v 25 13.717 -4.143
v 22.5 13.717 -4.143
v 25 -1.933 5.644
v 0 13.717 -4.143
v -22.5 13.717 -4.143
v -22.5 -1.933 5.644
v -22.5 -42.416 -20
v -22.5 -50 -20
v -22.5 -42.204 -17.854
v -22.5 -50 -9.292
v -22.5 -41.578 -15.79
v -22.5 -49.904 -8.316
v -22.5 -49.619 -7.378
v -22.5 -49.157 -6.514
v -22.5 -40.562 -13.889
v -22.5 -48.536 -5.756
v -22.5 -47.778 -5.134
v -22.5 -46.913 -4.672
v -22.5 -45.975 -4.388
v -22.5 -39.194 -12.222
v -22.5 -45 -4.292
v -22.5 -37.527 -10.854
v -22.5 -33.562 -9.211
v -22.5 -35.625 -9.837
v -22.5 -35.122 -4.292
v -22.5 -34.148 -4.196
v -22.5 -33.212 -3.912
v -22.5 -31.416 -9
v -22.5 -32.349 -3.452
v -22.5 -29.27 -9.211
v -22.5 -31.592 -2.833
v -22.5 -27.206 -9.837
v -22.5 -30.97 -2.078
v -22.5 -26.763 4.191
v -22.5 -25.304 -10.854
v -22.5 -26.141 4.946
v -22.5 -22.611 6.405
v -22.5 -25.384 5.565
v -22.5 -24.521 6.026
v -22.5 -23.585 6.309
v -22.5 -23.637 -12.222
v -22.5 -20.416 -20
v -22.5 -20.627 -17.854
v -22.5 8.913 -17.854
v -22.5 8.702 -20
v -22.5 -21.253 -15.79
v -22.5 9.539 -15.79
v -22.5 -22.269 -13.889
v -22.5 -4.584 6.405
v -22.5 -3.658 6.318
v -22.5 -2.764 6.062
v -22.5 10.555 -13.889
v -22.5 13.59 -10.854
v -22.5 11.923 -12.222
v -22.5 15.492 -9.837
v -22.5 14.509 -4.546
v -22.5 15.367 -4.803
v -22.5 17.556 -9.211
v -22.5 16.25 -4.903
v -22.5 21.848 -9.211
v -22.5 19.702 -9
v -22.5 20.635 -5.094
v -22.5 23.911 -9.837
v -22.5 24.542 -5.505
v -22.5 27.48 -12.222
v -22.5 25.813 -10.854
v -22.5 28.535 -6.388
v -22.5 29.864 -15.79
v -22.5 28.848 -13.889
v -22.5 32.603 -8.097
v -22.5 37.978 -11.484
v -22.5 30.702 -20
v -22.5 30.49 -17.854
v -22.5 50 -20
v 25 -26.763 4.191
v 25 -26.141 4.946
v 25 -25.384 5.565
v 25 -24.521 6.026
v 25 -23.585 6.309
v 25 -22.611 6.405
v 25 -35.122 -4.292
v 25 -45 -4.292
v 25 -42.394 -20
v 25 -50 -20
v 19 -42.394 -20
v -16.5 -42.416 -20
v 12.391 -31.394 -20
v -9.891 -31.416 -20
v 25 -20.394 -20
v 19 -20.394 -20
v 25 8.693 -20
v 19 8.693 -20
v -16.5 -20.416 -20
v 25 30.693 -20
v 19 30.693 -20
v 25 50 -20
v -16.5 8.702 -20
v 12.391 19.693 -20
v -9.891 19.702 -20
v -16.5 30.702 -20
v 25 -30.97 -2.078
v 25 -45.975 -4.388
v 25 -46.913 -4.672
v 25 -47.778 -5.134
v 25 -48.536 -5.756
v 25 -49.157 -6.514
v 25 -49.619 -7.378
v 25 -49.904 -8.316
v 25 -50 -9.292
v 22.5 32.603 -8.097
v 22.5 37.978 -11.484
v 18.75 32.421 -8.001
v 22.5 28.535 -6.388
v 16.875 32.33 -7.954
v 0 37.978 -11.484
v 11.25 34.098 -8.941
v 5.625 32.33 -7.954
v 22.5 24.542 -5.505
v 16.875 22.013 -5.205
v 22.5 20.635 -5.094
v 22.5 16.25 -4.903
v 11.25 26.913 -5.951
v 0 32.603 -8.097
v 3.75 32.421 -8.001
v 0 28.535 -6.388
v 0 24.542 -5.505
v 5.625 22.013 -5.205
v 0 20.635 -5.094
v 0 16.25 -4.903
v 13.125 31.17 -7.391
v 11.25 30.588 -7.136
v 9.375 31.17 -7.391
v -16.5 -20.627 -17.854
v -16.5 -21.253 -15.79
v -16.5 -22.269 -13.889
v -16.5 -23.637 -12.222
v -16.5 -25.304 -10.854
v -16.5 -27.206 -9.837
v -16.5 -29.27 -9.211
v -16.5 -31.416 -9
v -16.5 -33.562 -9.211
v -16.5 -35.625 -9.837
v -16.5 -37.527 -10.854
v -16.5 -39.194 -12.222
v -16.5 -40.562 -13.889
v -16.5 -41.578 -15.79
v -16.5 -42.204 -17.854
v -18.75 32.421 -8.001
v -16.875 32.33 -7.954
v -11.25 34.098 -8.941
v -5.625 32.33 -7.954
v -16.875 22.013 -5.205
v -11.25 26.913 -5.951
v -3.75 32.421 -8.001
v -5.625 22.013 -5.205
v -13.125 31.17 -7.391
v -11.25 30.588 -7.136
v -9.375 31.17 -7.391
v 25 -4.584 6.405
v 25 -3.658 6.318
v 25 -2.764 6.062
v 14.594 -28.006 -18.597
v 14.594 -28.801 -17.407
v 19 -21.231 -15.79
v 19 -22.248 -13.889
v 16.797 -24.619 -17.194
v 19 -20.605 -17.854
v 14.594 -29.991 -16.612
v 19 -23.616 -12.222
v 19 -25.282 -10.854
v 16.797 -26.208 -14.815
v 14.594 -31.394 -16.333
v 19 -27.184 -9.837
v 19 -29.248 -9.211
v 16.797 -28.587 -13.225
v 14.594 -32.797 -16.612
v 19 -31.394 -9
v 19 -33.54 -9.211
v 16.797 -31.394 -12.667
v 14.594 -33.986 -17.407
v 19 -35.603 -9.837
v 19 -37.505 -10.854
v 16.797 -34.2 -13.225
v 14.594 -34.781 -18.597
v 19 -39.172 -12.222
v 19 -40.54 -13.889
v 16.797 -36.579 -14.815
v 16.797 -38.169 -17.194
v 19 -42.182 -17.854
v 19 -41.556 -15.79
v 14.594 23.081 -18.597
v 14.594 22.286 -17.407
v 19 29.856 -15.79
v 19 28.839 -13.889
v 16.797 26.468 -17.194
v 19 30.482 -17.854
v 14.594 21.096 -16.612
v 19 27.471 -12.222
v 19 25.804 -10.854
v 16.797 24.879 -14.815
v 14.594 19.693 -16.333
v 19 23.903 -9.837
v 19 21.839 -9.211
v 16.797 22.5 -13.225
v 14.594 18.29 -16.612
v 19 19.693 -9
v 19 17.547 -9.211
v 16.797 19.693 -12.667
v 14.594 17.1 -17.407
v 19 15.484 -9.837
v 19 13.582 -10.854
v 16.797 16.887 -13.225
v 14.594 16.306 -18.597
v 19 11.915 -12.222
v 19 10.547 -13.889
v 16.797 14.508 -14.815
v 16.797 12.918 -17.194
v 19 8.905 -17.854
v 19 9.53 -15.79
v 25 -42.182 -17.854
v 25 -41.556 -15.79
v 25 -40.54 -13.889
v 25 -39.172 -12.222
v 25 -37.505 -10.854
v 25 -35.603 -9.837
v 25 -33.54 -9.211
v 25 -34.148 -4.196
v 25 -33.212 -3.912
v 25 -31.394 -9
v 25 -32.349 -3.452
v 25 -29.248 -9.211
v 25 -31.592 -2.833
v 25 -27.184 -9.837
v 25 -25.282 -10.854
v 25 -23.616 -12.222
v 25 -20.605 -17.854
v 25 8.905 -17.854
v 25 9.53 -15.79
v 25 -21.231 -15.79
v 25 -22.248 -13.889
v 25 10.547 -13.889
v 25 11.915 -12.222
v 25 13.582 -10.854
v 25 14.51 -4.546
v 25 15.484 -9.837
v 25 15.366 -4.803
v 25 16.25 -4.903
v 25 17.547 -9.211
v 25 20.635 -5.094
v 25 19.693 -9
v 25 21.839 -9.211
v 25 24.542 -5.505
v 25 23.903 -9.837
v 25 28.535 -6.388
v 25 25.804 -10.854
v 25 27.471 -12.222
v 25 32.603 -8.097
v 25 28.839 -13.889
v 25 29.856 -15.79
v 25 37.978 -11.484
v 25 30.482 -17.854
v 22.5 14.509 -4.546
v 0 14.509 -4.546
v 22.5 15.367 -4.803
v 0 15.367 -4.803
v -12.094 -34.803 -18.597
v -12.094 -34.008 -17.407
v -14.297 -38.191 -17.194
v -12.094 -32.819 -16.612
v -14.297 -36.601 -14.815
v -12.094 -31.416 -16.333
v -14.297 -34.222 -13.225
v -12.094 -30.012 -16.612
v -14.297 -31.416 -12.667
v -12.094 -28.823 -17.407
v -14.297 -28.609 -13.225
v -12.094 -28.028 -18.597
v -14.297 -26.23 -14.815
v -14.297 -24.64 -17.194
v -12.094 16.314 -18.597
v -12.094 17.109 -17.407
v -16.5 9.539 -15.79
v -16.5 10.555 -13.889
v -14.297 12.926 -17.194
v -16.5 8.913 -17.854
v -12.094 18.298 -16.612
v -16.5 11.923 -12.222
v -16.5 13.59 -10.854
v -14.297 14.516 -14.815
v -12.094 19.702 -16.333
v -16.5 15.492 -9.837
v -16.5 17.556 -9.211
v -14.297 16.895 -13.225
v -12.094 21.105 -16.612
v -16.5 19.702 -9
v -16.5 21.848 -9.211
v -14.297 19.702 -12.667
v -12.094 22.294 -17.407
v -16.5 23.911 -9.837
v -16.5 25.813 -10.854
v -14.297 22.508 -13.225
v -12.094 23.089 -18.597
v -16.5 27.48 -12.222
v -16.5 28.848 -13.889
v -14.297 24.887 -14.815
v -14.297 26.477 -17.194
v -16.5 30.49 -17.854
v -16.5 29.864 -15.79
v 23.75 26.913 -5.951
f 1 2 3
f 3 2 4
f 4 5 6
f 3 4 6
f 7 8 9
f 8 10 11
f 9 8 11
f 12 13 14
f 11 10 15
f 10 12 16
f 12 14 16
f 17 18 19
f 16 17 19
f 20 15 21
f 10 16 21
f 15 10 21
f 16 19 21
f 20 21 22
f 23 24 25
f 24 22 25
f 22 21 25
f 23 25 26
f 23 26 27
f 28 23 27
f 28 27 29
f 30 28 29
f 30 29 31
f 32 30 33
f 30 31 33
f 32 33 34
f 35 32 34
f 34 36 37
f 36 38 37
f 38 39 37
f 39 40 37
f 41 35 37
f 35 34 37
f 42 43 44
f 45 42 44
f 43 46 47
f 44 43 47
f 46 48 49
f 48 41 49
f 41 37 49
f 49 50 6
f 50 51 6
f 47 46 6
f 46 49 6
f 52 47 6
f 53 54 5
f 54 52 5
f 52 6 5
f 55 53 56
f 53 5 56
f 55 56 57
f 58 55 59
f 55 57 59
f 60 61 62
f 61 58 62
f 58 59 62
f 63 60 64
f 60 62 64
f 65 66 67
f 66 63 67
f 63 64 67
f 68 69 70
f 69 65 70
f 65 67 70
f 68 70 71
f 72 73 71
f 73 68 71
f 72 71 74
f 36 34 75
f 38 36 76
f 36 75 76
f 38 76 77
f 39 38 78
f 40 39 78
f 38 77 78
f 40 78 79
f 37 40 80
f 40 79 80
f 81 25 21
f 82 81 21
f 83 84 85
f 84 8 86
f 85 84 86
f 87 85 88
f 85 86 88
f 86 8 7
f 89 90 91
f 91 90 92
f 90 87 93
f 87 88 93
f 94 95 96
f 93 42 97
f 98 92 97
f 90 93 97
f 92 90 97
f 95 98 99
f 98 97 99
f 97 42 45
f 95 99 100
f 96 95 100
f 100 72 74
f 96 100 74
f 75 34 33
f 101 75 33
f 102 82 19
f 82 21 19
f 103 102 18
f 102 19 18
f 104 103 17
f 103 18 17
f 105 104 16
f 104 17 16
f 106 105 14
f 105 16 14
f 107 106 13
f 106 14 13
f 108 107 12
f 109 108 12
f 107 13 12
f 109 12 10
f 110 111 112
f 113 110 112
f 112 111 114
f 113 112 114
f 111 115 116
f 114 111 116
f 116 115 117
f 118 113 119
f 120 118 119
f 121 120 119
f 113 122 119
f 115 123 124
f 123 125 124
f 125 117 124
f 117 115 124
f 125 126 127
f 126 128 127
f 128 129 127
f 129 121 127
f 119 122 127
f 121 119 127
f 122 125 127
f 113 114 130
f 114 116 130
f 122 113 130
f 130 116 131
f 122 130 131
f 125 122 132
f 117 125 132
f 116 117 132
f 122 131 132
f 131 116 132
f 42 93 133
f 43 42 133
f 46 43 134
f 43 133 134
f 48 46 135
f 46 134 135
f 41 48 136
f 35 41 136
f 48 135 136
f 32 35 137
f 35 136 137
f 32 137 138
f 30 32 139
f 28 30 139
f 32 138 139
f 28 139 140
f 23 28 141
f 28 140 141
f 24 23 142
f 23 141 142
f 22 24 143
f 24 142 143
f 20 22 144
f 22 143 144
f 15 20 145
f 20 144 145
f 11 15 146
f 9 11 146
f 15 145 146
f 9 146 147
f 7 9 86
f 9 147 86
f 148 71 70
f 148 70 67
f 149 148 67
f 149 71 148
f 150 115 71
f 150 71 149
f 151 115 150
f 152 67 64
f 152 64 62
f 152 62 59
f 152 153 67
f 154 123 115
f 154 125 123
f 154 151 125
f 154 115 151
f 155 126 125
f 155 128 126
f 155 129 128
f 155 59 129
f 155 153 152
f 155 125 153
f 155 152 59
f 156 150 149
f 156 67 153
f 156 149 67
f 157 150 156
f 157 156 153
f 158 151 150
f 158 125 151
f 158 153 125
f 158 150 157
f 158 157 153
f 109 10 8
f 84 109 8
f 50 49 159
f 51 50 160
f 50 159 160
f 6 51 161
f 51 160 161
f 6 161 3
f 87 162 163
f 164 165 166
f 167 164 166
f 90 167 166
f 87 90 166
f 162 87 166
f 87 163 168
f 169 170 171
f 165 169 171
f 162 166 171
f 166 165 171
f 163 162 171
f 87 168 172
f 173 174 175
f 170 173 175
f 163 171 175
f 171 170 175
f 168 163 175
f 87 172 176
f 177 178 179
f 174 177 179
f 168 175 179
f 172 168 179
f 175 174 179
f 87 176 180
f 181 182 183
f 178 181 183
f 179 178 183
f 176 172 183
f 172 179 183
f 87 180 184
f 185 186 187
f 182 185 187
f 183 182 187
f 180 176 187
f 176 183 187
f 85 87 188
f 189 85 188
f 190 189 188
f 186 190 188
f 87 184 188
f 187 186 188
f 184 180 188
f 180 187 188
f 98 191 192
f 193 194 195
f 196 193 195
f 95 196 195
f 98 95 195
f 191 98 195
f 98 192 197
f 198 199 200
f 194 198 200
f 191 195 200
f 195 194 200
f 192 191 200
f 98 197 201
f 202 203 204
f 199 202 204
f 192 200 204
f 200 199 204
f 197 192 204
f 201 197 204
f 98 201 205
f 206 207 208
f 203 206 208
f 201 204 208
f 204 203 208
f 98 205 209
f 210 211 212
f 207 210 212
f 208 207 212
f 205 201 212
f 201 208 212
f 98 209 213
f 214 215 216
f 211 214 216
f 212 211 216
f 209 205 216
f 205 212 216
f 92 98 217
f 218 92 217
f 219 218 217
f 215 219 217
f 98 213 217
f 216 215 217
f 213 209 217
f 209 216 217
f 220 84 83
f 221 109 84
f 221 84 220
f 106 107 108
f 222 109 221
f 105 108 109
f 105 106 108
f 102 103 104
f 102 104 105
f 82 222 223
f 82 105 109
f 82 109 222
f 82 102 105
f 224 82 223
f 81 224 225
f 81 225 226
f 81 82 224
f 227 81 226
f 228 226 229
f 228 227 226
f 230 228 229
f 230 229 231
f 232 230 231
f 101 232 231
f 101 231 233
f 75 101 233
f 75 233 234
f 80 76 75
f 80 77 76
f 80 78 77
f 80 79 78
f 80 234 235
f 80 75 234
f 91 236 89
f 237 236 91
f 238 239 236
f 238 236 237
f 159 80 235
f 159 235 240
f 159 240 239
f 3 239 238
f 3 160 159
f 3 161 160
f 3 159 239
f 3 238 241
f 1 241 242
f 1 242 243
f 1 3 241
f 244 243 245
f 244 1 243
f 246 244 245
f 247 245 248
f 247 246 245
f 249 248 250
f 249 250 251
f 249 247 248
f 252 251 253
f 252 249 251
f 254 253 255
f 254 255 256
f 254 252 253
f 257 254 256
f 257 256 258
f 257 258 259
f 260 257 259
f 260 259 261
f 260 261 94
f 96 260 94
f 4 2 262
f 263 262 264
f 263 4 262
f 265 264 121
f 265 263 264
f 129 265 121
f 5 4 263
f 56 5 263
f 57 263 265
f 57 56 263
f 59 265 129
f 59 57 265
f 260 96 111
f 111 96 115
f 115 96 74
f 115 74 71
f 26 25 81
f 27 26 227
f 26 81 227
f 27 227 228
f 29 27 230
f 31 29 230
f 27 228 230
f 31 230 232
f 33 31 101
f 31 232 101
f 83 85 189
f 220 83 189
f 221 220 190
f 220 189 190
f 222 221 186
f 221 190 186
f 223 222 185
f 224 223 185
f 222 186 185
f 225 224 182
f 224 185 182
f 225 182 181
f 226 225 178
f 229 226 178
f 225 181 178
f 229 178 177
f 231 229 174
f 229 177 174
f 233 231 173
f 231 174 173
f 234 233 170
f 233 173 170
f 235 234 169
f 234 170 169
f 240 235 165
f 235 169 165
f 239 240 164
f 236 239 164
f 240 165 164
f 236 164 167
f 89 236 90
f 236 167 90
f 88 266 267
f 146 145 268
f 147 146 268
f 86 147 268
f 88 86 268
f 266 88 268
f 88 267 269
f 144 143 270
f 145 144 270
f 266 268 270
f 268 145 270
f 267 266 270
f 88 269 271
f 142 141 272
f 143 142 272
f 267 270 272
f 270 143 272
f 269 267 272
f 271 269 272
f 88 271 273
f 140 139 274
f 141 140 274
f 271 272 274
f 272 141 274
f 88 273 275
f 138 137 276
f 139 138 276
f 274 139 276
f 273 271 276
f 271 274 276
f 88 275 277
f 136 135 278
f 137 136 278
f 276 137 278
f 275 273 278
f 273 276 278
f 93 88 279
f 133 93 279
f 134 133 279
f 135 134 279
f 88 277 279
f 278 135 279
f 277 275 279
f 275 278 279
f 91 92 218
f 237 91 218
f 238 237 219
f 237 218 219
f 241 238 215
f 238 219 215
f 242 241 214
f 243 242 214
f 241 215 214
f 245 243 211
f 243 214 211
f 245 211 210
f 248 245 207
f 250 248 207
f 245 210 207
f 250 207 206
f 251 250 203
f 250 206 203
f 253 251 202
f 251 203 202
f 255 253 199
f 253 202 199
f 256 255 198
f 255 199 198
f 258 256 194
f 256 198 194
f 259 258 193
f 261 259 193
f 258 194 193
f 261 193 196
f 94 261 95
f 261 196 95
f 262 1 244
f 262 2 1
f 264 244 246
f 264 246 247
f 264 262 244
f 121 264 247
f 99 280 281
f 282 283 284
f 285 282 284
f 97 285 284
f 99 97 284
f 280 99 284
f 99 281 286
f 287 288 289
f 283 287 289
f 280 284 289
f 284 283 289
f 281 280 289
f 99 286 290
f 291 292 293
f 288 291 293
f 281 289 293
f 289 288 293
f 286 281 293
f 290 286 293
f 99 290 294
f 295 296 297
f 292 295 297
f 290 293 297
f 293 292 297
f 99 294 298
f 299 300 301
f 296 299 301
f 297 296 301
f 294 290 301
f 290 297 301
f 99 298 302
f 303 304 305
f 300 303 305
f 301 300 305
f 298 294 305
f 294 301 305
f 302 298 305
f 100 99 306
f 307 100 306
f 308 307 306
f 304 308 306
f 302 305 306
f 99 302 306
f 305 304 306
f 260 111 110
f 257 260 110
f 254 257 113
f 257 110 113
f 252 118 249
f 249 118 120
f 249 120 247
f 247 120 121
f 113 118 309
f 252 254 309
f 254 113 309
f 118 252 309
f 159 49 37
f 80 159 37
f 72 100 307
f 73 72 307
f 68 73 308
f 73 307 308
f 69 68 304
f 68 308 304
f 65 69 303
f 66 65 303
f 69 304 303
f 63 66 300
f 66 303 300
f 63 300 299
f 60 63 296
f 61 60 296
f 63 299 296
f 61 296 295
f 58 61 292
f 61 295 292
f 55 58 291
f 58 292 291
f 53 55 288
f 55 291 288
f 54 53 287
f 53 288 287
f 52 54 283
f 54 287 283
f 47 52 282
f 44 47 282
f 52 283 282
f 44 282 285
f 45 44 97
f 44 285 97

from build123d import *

# Parameters (mm, degrees)
F1_DEPTH = 22.5
F2_DEPTH = 25
F3_R     = 5
F5_D     = 22
F5_DEPTH = 6
F5_TIP   = 6.6094668093
F6_D     = 22
F6_DEPTH = 6
F6_TIP   = 6.6094668093
F8_D     = 22
F8_DEPTH = 6
F8_TIP   = 6.6094668093
F9_D     = 22
F9_DEPTH = 6
F9_TIP   = 6.6094668093


with BuildPart() as f1:
    # F0 (on Right) → F1 (new body, symmetric)
    with BuildSketch(Plane.YZ):
        with BuildLine():
            Line((-50, -20), (50, -20))
            Line((50, -20), (37.9778109491, -11.483842507))
            add(Edge.make_bspline(
                [(37.9778109491, -11.483842507), (33.7362140417, -8.5331639275), (28.4293044028, -5.4691263704), (19.5910925664, -4.9491255013), (14.8890013853, -4.8763493822)],
                knots=[0, 0, 0, 0, 0.441705983, 0.8114966727, 0.8114966727, 0.8114966727, 0.8114966727], degree=3))
            Line((14.8890013853, -4.8763493822), (-3.1495152507, 6.404644344))
            Line((-3.1495152507, 6.404644344), (-25.2773519605, 6.404644344))
            Line((-25.2773519605, 6.404644344), (-32.455407083, -4.2915642262))
            Line((-32.455407083, -4.2915642262), (-50, -4.2915642262))
            Line((-50, -4.2915642262), (-50, -20))
        make_face()
    extrude(amount=F1_DEPTH, both=True)

    # F0 (on Right) → F2 (join)
    with BuildSketch(Plane.YZ):
        with BuildLine():
            Line((-50, -20), (50, -20))
            Line((50, -20), (37.9778109491, -11.483842507))
            add(Edge.make_bspline(
                [(37.9778109491, -11.483842507), (33.7362140417, -8.5331639275), (28.4293044028, -5.4691263704), (19.5910925664, -4.9491255013), (14.8890013853, -4.8763493822)],
                knots=[0, 0, 0, 0, 0.441705983, 0.8114966727, 0.8114966727, 0.8114966727, 0.8114966727], degree=3))
            Line((14.8890013853, -4.8763493822), (-3.1495152507, 6.404644344))
            Line((-3.1495152507, 6.404644344), (-25.2773519605, 6.404644344))
            Line((-25.2773519605, 6.404644344), (-32.455407083, -4.2915642262))
            Line((-32.455407083, -4.2915642262), (-50, -4.2915642262))
            Line((-50, -4.2915642262), (-50, -20))
        make_face()
    extrude(amount=F2_DEPTH)

    # F3
    f3_edges = [f1.edges().sort_by_distance(p)[0] for p in [
        (1.25, -25.277352, 6.404644),
        (1.25, -32.455407, -4.291564),
        (1.25, -50, -4.291564),
        (1.25, -3.149515, 6.404644),
        (-11.25, 14.889001, -4.876349),
        (23.75, 14.889001, -4.876349),
        (11.25, 14.889001, -4.876349),
    ]]
    fillet(f3_edges, radius=F3_R)

    # F5
    with Locations(Plane.YZ.offset(25)):
        with Locations((-31.3936918974, -20)):
            Hole(F5_D / 2, depth=F5_DEPTH)
            with Locations((0, 0, -(F5_DEPTH + F5_TIP / 2))):  # 118° drill point
                Cone(0, F5_D / 2, F5_TIP, mode=Mode.SUBTRACT)

    # F6
    with Locations(Plane.YZ.offset(25)):
        with Locations((19.693158567, -20)):
            Hole(F6_D / 2, depth=F6_DEPTH)
            with Locations((0, 0, -(F6_DEPTH + F6_TIP / 2))):  # 118° drill point
                Cone(0, F6_D / 2, F6_TIP, mode=Mode.SUBTRACT)

    # F8
    with Locations(Plane(origin=(-22.5, 0, 0), x_dir=(0, -1, 0), z_dir=(-1, 0, 0))):
        with Locations((-19.701551646, -20)):
            Hole(F8_D / 2, depth=F8_DEPTH)
            with Locations((0, 0, -(F8_DEPTH + F8_TIP / 2))):  # 118° drill point
                Cone(0, F8_D / 2, F8_TIP, mode=Mode.SUBTRACT)

    # F9
    with Locations(Plane(origin=(-22.5, 0, 0), x_dir=(0, -1, 0), z_dir=(-1, 0, 0))):
        with Locations((31.4156152308, -20)):
            Hole(F9_D / 2, depth=F9_DEPTH)
            with Locations((0, 0, -(F9_DEPTH + F9_TIP / 2))):  # 118° drill point
                Cone(0, F9_D / 2, F9_TIP, mode=Mode.SUBTRACT)


solid = f1.part
